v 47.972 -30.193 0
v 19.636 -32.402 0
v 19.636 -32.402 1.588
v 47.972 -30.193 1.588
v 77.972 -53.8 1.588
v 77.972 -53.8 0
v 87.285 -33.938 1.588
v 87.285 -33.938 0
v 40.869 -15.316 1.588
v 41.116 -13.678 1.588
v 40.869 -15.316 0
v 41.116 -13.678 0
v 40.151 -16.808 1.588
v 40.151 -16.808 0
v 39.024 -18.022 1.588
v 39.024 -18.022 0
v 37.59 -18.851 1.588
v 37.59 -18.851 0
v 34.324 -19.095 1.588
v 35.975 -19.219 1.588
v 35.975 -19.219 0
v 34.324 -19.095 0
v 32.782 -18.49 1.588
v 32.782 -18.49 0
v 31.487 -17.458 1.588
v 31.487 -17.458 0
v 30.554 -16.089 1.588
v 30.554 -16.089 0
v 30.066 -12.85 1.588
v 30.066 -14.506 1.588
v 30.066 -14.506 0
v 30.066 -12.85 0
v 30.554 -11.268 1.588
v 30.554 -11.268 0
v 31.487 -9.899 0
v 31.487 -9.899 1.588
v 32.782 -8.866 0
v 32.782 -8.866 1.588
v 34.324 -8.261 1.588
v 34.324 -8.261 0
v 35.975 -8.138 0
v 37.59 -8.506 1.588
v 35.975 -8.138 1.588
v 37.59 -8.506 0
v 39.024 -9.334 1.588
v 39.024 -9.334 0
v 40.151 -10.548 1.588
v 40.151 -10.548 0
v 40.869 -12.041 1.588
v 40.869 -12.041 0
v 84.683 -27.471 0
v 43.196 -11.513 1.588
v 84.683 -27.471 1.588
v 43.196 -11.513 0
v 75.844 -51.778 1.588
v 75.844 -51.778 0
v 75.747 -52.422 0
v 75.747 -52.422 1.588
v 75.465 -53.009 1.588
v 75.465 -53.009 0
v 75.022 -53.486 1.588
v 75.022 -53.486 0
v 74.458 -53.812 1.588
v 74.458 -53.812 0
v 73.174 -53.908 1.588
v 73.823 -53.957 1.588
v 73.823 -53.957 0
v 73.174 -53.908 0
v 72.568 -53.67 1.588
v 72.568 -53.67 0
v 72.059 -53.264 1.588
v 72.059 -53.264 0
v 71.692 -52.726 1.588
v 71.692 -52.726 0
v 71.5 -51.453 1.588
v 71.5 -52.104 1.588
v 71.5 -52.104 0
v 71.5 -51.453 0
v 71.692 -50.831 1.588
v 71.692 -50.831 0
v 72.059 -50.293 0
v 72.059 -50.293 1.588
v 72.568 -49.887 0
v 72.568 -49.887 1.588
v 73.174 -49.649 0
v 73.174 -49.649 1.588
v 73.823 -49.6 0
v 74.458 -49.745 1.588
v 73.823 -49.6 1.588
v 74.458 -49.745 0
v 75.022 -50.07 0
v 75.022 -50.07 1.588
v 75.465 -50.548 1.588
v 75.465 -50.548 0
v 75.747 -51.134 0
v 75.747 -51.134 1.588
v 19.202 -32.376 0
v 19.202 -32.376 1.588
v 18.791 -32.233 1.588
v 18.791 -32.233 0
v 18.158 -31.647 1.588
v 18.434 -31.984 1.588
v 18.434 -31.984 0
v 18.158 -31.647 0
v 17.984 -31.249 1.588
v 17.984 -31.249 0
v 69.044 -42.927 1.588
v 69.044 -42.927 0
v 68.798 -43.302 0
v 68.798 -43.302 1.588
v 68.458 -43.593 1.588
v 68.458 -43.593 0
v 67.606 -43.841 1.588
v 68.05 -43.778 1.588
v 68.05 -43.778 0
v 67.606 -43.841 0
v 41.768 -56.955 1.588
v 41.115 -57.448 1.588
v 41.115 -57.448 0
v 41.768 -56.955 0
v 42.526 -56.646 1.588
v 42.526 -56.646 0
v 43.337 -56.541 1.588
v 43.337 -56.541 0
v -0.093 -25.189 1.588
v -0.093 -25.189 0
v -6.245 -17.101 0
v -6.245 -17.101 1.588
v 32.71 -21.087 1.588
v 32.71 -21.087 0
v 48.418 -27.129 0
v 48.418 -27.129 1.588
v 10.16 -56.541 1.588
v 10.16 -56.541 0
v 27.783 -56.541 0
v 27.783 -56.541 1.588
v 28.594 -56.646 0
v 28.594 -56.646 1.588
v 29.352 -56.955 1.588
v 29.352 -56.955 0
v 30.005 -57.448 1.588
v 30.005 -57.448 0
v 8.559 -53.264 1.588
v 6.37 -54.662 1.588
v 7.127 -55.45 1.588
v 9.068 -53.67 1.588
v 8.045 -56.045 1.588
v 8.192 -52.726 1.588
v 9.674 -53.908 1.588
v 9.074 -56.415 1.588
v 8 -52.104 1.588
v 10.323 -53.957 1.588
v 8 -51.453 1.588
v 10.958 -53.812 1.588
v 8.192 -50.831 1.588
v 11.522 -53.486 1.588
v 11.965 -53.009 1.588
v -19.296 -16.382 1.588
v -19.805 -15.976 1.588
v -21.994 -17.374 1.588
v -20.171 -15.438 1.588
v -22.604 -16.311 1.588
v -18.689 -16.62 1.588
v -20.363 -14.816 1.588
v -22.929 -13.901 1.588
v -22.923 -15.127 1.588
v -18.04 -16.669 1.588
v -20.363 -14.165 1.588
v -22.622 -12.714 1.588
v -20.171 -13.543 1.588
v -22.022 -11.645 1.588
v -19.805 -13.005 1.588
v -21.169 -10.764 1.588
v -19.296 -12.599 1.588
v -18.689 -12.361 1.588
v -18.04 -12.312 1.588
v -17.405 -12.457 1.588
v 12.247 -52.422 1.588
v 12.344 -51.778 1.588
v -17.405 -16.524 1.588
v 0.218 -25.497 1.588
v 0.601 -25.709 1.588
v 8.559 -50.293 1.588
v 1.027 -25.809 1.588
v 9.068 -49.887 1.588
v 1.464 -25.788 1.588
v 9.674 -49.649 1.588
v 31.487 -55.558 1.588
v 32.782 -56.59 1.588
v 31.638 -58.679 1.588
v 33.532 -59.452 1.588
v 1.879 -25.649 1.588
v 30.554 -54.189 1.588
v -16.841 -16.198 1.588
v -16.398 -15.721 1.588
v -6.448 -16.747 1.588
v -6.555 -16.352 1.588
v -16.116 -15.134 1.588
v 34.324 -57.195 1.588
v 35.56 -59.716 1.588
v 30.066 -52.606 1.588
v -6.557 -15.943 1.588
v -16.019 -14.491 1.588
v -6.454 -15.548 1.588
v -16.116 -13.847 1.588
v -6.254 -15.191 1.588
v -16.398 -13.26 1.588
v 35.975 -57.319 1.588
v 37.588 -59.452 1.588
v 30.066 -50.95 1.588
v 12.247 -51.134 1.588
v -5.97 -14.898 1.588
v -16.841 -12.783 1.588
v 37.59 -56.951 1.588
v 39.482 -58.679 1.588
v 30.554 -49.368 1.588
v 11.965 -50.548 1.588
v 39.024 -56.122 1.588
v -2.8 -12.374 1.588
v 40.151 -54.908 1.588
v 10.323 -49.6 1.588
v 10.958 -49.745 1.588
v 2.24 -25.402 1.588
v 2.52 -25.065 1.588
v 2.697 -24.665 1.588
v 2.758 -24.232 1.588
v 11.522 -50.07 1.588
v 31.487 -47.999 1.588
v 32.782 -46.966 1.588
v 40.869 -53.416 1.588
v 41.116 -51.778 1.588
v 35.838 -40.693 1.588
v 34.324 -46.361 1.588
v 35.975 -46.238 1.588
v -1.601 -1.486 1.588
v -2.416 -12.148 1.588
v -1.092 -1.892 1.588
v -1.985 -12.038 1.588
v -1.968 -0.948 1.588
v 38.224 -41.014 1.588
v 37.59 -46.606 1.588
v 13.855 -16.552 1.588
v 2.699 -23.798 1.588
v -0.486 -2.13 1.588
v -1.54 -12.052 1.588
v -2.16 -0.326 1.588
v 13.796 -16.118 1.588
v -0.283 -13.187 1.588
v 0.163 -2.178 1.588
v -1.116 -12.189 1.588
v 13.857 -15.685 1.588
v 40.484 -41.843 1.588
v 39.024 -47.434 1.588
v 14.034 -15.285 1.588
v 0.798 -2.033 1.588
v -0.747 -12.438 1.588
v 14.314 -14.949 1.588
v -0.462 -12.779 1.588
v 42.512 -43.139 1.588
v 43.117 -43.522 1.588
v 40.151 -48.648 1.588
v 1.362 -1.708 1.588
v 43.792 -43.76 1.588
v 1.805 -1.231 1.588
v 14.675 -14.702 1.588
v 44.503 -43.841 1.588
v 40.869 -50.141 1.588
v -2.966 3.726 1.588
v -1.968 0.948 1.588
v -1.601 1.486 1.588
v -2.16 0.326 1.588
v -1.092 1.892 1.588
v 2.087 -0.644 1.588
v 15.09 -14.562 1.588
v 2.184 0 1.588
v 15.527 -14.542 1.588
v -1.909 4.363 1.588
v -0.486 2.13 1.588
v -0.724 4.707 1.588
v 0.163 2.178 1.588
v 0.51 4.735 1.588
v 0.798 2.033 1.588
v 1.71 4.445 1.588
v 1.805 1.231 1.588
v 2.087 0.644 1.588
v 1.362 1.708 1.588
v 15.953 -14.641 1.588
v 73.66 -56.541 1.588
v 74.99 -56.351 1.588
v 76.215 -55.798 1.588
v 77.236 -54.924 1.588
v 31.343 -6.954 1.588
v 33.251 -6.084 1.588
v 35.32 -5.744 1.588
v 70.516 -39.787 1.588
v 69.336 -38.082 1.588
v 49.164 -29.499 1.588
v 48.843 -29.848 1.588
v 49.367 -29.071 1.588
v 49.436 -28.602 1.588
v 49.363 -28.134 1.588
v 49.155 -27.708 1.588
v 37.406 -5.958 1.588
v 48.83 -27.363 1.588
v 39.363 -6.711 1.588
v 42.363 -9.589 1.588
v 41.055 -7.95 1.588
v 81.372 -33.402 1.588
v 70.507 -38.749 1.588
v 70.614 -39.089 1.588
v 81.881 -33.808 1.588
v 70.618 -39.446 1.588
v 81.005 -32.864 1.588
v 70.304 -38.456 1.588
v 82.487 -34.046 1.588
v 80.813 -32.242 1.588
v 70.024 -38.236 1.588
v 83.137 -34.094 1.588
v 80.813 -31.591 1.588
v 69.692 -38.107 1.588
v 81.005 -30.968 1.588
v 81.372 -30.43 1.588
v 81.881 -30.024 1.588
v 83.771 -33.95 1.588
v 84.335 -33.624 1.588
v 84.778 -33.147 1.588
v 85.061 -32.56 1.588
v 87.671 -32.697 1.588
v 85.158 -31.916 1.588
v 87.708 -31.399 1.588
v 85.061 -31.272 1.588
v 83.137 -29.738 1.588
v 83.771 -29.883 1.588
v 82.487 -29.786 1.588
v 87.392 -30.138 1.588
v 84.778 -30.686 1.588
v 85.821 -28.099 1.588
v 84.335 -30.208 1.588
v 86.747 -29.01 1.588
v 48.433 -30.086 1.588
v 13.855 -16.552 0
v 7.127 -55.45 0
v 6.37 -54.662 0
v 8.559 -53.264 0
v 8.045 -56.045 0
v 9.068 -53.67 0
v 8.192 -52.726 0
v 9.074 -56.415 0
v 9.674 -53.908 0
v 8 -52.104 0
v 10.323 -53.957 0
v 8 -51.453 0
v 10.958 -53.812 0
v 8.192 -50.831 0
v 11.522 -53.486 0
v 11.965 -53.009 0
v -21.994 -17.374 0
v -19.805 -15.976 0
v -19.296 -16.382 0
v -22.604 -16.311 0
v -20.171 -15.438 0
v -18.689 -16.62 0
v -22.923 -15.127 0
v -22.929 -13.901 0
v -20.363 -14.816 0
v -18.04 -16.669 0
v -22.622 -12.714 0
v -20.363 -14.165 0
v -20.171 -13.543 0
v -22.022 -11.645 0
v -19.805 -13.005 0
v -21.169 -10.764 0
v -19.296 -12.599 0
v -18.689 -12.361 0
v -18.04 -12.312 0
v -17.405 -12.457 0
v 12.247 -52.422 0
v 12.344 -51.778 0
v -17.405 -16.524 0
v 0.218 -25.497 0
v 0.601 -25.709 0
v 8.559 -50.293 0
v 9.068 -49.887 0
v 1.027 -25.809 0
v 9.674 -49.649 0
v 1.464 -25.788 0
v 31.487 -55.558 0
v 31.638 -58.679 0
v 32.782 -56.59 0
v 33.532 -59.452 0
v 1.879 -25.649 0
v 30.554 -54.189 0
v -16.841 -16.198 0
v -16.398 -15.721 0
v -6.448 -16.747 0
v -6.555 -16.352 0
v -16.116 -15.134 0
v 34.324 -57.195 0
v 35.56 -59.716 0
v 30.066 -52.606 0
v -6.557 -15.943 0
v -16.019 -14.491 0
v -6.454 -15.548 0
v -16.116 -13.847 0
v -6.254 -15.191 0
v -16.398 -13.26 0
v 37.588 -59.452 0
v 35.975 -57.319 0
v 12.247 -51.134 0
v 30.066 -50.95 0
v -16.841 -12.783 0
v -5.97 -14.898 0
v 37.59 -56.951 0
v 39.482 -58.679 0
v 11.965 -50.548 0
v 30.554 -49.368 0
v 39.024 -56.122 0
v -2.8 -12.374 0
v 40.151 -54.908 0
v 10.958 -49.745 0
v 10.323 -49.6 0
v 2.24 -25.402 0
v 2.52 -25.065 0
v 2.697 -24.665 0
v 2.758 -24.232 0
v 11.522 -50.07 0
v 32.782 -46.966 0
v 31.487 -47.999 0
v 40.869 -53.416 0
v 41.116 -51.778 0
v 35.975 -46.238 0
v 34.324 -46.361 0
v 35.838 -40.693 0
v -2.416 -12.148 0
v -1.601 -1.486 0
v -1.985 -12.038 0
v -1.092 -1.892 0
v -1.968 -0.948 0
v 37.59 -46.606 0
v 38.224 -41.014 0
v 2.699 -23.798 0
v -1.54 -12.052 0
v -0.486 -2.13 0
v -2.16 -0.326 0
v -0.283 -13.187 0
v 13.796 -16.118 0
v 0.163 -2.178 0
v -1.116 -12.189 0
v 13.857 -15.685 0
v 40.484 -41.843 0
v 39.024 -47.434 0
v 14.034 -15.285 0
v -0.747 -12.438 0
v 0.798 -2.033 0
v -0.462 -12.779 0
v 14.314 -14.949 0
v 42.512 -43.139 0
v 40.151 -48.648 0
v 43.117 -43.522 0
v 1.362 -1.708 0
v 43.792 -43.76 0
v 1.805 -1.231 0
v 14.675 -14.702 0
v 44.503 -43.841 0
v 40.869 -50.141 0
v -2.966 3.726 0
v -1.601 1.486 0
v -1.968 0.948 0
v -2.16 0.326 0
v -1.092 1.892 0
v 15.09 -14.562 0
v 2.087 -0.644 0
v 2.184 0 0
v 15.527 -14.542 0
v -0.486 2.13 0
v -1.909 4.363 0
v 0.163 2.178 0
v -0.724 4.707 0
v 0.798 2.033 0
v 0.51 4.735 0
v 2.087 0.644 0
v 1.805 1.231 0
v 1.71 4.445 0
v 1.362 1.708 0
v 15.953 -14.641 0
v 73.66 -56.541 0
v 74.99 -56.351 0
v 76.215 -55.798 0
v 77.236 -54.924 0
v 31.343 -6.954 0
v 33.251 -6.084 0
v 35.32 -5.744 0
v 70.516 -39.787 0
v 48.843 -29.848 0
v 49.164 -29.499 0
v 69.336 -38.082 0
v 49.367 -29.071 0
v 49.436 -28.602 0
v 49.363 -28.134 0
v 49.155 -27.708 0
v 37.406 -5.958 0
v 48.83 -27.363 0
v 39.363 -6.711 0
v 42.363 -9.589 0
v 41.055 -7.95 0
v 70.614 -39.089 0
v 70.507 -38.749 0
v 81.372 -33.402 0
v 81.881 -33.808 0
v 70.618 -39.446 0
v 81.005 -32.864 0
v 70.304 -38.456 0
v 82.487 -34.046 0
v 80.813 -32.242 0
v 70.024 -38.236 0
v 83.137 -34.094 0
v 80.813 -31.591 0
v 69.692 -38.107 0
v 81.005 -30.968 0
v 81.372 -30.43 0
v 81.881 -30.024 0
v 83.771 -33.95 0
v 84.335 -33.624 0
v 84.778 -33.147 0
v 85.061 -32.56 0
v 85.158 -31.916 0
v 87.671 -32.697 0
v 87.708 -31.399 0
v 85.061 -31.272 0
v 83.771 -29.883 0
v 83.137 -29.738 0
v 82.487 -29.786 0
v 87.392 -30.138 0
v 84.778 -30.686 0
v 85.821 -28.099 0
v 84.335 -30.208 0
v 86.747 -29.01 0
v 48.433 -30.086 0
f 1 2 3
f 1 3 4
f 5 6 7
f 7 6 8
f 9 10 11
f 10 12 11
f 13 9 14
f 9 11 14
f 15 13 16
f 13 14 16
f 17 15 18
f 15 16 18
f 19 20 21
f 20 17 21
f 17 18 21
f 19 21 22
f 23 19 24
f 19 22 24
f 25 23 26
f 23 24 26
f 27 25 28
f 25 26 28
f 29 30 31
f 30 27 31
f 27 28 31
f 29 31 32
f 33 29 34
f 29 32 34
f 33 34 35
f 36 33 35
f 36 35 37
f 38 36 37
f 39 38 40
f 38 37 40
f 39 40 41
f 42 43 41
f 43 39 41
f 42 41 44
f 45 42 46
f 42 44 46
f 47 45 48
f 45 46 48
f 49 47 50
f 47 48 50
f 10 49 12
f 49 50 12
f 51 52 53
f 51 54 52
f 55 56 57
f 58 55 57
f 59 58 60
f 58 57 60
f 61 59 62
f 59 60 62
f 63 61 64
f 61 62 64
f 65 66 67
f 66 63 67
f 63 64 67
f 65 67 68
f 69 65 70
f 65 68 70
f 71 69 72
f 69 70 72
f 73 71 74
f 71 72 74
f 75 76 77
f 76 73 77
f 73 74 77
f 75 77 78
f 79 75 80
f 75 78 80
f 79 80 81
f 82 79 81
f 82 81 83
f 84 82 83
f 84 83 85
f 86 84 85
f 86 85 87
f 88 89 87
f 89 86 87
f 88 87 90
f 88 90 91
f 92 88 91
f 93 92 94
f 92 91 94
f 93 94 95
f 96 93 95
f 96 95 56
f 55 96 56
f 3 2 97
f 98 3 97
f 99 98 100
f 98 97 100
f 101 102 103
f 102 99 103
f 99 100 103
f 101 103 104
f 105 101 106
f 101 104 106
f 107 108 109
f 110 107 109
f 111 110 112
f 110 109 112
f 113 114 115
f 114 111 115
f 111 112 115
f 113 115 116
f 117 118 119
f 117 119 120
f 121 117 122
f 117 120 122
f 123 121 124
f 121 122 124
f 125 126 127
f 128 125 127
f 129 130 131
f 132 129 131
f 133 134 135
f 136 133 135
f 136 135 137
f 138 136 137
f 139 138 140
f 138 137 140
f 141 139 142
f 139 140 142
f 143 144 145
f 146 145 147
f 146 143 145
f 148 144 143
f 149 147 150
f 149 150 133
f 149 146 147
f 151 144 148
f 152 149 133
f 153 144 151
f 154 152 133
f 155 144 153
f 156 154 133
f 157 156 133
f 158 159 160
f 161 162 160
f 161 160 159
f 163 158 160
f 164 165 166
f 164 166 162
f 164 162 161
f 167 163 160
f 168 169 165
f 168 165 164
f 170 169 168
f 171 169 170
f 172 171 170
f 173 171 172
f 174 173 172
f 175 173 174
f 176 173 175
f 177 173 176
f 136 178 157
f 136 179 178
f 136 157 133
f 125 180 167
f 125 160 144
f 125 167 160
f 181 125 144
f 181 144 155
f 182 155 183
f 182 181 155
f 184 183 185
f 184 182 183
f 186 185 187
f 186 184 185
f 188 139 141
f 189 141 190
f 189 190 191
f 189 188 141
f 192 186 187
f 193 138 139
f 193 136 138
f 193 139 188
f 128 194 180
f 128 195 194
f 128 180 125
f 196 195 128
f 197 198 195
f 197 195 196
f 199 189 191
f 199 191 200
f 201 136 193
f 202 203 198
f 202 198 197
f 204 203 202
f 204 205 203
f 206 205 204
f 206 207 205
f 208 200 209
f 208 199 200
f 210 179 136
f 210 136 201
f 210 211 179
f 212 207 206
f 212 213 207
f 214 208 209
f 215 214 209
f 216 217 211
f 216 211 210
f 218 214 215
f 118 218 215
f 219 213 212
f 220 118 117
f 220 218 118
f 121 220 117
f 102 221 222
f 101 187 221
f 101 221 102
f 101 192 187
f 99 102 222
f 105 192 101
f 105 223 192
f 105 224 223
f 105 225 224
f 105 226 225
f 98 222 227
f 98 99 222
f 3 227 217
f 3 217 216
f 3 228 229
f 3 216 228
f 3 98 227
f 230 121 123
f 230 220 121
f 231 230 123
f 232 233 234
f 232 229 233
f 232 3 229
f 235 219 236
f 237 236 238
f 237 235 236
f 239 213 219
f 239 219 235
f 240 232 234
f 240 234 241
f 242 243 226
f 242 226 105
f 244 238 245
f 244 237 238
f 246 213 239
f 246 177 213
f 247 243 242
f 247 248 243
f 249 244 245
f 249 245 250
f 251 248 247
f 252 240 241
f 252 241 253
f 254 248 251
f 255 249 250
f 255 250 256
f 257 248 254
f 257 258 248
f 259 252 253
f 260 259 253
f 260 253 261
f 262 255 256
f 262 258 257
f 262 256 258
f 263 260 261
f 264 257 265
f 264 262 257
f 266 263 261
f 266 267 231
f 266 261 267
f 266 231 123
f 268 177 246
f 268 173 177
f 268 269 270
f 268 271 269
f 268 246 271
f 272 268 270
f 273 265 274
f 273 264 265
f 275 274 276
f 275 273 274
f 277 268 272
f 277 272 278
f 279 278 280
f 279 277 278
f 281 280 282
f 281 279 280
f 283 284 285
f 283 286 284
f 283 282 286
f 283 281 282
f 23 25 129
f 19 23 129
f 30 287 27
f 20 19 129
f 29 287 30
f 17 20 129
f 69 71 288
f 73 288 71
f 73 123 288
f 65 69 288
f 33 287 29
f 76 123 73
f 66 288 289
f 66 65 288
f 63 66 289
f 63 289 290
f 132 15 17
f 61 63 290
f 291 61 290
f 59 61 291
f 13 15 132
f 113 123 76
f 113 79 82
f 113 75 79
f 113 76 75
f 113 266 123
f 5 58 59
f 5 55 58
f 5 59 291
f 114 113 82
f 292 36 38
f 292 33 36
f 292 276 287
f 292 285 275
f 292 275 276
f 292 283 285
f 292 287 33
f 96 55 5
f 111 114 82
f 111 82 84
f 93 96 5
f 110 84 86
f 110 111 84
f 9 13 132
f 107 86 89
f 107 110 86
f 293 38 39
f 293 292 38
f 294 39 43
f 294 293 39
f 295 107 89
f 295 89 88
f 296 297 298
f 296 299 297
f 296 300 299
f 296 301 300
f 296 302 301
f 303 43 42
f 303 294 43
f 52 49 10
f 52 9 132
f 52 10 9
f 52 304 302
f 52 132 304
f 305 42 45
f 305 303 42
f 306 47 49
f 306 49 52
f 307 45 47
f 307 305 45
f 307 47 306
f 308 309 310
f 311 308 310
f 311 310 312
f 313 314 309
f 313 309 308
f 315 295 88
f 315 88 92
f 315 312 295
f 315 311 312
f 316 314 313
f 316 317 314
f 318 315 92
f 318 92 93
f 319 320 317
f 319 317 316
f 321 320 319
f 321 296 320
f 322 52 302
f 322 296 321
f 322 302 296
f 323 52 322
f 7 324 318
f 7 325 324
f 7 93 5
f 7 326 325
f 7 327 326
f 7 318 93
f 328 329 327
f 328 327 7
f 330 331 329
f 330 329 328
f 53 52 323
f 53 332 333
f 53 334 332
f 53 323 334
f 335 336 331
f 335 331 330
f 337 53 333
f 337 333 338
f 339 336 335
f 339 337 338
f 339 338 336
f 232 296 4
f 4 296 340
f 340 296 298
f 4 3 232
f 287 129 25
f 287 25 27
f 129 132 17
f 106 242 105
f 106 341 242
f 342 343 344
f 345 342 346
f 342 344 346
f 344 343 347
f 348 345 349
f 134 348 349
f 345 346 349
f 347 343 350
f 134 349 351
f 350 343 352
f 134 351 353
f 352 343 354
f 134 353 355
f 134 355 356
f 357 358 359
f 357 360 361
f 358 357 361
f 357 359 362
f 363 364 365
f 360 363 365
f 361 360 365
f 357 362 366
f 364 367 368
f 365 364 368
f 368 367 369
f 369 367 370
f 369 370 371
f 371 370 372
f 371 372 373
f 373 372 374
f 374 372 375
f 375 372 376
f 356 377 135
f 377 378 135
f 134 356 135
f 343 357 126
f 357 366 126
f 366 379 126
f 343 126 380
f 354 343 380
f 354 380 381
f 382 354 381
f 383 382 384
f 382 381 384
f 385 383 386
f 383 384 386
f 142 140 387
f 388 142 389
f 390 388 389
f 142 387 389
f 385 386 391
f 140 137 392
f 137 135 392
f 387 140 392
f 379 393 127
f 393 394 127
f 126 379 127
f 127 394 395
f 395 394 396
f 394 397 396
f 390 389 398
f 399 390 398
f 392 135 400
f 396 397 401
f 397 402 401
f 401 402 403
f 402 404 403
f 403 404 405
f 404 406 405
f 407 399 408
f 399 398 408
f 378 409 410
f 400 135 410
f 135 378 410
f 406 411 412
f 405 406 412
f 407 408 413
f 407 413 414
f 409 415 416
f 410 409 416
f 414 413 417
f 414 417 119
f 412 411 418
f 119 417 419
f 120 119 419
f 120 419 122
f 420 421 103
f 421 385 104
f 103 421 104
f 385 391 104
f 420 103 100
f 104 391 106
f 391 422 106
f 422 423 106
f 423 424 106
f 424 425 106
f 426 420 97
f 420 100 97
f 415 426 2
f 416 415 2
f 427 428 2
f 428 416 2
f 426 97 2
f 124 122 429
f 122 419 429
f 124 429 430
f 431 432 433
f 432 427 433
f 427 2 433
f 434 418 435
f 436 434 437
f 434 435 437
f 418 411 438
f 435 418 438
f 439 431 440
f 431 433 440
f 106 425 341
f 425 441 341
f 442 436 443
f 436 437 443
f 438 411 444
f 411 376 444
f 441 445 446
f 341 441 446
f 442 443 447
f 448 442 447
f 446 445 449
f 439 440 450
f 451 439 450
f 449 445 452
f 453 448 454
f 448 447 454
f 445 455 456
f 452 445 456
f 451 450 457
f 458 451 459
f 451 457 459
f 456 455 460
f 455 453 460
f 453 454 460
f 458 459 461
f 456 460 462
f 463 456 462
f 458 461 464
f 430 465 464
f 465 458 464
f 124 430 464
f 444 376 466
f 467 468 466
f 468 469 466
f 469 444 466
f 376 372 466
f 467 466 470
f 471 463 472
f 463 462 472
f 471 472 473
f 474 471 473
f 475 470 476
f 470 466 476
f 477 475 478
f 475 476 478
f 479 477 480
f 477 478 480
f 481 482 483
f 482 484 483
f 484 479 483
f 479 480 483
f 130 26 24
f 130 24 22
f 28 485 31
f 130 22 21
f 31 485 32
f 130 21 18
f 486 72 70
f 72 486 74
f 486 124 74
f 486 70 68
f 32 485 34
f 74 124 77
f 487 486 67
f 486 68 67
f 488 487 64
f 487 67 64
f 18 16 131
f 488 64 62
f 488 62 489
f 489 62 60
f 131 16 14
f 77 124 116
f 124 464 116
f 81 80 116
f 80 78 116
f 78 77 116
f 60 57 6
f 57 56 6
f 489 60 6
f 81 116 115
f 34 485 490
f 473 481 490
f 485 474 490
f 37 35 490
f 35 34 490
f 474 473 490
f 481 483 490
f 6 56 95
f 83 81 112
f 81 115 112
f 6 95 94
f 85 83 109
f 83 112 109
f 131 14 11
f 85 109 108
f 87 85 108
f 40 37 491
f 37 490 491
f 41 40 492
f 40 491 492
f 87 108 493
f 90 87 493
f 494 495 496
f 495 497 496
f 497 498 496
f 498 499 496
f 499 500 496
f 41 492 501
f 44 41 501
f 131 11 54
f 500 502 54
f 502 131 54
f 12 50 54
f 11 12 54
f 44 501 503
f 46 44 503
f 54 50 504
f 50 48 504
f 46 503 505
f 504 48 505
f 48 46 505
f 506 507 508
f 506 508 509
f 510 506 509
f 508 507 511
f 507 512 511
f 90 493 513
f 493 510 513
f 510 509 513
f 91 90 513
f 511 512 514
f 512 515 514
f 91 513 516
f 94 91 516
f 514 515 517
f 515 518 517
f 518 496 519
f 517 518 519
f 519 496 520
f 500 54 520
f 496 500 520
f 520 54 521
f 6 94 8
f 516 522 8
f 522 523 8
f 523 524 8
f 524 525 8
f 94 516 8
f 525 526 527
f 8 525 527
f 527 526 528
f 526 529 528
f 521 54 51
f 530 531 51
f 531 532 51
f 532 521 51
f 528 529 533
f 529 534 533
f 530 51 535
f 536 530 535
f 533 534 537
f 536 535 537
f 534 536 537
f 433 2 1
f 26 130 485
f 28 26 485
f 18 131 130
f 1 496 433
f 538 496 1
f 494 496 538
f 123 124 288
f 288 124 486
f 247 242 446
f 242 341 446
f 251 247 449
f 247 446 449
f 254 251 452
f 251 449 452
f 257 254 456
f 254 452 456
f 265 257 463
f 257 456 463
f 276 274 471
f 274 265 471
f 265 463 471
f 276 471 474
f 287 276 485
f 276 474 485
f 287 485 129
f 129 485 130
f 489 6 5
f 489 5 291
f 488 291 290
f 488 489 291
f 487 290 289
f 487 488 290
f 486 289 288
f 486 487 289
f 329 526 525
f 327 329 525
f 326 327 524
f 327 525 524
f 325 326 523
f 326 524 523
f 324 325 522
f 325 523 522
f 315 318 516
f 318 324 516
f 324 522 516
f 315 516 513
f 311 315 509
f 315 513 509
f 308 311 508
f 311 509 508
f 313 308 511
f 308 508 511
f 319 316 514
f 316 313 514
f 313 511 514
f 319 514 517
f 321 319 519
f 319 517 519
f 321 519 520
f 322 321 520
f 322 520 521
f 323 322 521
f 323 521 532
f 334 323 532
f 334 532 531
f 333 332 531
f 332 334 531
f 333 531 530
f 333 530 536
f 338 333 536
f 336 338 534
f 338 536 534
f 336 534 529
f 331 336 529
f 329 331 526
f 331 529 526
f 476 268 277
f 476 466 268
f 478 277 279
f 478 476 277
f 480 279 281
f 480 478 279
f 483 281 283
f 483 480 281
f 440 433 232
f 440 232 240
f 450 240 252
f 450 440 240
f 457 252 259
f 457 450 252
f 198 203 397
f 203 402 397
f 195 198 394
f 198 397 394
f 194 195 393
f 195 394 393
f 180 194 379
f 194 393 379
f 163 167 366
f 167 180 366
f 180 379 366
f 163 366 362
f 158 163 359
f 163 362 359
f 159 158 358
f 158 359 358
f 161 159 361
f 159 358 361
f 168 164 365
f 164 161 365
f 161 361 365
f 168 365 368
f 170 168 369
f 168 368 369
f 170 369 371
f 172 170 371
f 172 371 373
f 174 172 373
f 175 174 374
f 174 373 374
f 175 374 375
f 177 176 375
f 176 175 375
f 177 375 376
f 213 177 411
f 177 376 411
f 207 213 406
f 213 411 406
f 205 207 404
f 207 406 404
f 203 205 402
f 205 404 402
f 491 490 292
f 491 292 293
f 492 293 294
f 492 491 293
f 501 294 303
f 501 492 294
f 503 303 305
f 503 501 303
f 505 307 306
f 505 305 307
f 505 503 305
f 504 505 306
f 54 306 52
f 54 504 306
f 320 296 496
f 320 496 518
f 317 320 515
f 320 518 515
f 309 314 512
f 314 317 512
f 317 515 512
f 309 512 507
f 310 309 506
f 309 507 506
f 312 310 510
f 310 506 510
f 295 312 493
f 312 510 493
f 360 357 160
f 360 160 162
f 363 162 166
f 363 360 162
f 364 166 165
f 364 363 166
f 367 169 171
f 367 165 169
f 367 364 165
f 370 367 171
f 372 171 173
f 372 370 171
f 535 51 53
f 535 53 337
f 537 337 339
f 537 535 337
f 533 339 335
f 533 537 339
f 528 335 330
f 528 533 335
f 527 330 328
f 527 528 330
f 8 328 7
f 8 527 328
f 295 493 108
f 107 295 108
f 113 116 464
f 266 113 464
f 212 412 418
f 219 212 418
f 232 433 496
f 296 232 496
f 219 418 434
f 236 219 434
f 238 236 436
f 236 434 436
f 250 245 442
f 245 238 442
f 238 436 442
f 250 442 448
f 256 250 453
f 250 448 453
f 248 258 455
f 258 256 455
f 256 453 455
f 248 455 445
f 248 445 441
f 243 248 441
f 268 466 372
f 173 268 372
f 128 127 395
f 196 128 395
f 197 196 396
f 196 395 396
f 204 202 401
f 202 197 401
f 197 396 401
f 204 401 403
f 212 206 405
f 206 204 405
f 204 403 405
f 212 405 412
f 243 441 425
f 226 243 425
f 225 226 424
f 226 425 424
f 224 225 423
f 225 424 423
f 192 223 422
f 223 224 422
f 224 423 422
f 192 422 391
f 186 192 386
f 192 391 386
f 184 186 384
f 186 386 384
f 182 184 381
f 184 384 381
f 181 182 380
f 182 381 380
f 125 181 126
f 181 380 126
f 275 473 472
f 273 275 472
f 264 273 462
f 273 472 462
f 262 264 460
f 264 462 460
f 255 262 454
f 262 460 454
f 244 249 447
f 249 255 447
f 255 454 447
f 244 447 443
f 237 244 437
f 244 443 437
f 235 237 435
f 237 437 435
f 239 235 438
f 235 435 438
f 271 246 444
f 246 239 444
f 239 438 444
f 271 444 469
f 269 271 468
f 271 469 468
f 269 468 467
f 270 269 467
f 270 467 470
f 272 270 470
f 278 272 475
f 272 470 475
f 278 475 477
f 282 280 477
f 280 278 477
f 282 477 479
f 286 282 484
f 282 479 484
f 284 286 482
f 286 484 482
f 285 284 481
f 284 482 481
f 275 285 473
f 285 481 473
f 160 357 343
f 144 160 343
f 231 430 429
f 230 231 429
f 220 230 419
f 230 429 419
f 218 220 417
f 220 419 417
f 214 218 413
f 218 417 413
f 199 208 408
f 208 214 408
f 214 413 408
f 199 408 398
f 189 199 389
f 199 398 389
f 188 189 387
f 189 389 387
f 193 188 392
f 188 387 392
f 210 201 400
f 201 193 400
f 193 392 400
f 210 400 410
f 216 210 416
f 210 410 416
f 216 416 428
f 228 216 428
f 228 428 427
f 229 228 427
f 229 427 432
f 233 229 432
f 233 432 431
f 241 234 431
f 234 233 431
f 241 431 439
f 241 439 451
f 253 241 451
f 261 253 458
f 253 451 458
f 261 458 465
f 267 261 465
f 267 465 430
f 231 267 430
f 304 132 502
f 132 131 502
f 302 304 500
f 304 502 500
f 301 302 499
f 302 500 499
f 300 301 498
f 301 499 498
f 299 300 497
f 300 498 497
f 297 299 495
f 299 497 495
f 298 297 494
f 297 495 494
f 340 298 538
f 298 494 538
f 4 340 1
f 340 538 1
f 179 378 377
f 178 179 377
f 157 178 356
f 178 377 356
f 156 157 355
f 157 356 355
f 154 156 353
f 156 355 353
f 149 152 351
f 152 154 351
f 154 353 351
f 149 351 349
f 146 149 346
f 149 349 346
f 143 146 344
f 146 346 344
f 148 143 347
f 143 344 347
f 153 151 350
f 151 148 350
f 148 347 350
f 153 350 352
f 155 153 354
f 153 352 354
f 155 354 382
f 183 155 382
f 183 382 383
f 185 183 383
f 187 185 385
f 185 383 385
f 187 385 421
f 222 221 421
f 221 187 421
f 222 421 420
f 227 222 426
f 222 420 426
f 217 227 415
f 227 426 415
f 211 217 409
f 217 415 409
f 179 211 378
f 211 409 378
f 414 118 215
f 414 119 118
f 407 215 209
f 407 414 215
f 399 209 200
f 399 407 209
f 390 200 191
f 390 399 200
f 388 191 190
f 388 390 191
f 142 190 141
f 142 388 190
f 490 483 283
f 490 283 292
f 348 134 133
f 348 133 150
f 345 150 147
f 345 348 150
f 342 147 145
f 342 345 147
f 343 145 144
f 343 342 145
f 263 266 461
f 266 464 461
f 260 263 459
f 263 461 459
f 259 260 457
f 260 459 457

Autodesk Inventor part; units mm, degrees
ref_plane "YZ Plane" through (0, 0, 0) normal (1, 0, 0) x (0, 1, 0)
ref_plane "XZ Plane" through (0, 0, 0) normal (0, 1, 0) x (-1, 0, 0)
ref_plane "XY Plane" through (0, 0, 0) normal (0, 0, 1) x (1, 0, 0)
sketch "main" plane through (0, 0, 0) normal (0, 0, 1) x (1, 0, 0)
  circle A0 centre (36.5381, -21.0803) radius 2.1844
  circle A1 centre (-26.9619, -21.0803) radius 2.1844
  circle A2 centre (-37.1219, 30.698) radius 2.1844
  circle A3 centre (45.8515, -1.2181) radius 2.1844
  circle A4 centre (-55.3252, 16.2075) radius 2.1844
  point P0 (-7.4039, 0.7054)
sketch "Sketch1" plane through (0, 0, 0) normal (0, 0, 1) x (1, 0, 0)
  arc A0 (-21.1694, -10.7645) -> (-21.9938, -17.3739) centre (-18.2033, -14.4906) ccw
  arc A1 (1.7098, 4.445) -> (-2.9661, 3.7261) centre (0, 0) ccw
  arc A2 (6.3695, -54.6616) -> (10.16, -56.5408) centre (10.16, -51.7783) ccw
  arc A3 (73.66, -56.5408) -> (77.972, -53.8002) centre (73.66, -51.7783) ccw
  arc A4 (87.2853, -33.938) -> (84.6831, -27.4711) centre (82.9733, -31.9161) ccw
  line L0 (77.972, -53.8002) -> (87.2853, -33.938)
  line L1 (-2.9661, 3.7261) -> (-21.1694, -10.7645)
  line L2 (-21.9938, -17.3739) -> (6.3695, -54.6616)
  line L3 (-5.9701, -14.8978) -> (-2.7997, -12.374)
  line L4 (70.5159, -39.7871) -> (69.0435, -42.9273)
  line L5 (67.6061, -43.8408) -> (44.5028, -43.8408)
  line L6 (-0.0927, -25.1889) -> (-6.2449, -17.1009)
  line L7 (-0.2827, -13.1866) -> (2.6991, -23.7983)
  line L8 (13.8548, -16.552) -> (17.9845, -31.2486)
  line L9 (35.8381, -40.6928) -> (69.3364, -38.0816)
  line L10 (19.6361, -32.4018) -> (47.9716, -30.1931)
  arc A5 (-0.2827, -13.1866) -> (-2.7997, -12.374) centre (-1.811, -13.6161) ccw
  arc A6 (-5.9701, -14.8978) -> (-6.2449, -17.1009) centre (-4.9814, -16.1398) ccw
  arc A7 (-0.0927, -25.1889) -> (2.6991, -23.7983) centre (1.1708, -24.2278) ccw
  arc A8 (15.9531, -14.6409) -> (13.8548, -16.552) centre (15.3831, -16.1225) ccw
  arc A9 (17.9845, -31.2486) -> (19.6361, -32.4018) centre (19.5128, -30.8191) ccw
  arc A10 (47.9716, -30.1931) -> (48.4182, -27.1287) centre (47.8482, -28.6104) ccw
  arc A11 (67.6061, -43.8408) -> (69.0435, -42.9273) centre (67.6061, -42.2533) ccw
  arc A12 (70.5159, -39.7871) -> (69.3364, -38.0816) centre (69.4296, -39.2778) ccw
  circle A13 centre (35.56, -51.7783) radius 5.5563
  line L11 (10.16, -56.5408) -> (27.7829, -56.5408)
  line L12 (43.3371, -56.5408) -> (73.66, -56.5408)
  arc A14 (30.0049, -57.448) -> (41.1151, -57.448) centre (35.56, -51.7783) ccw
  arc A15 (42.5123, -43.1393) -> (35.8381, -40.6928) centre (35.56, -51.7783) ccw
  arc A16 (30.0049, -57.448) -> (27.7829, -56.5408) centre (27.7829, -59.7158) ccw
  arc A17 (43.3371, -56.5408) -> (41.1151, -57.448) centre (43.3371, -59.7158) ccw
  arc A18 (42.5123, -43.1393) -> (44.5028, -43.8408) centre (44.5028, -40.6658) ccw
  circle A19 centre (35.56, -13.6783) radius 5.5563
  line L13 (1.7098, 4.445) -> (31.3431, -6.9536)
  line L14 (43.1965, -11.513) -> (84.6831, -27.4711)
  arc A20 (32.7104, -21.0867) -> (32.7104, -21.0867) centre (35.56, -13.6783) ccw
  arc A21 (43.1965, -11.513) -> (31.3431, -6.9536) centre (35.56, -13.6783) ccw
  line L15 (15.9531, -14.6409) -> (32.7104, -21.0867)
  line L16 (32.7104, -21.0867) -> (48.4182, -27.1287)
  circle A22 centre (73.66, -51.7783) radius 2.1844
  circle A23 centre (10.16, -51.7783) radius 2.1844
  circle A24 centre (0, 0) radius 2.1844
  circle A25 centre (82.9733, -31.9161) radius 2.1844
  circle A26 centre (-18.2033, -14.4906) radius 2.1844
  point P0 (0, 0)
  point P1 (17.1709, -28.3531)
  point P2 (29.21, -56.5408)
  point P3 (41.91, -56.5408)
  point P4 (43.3035, -43.8408)
  dimension "d0" = 9.525
  dimension "d1" = 9.525
  dimension "d2" = 9.525
  dimension "d3" = 9.525
  dimension "d4" = 9.525
  dimension "d5" = 12.7
  dimension "d7" = 9.525
  dimension "d8" = 1.5875
  dimension "d9" = 1.5875
  dimension "d13" = 11.1125
  dimension "d16" = 3.175
  dimension "d18" = 11.1125
  dimension "d20" = 12.7
  dimension "d21" = 12.7
  dimension "d22" = 12.7
  dimension "d23" = 12.7
extrude "Extrusion1" add sketch "Sketch1" along normal blind 1.5875
properties part number "gearbox_gusset" material "Acetal Resin, White"
